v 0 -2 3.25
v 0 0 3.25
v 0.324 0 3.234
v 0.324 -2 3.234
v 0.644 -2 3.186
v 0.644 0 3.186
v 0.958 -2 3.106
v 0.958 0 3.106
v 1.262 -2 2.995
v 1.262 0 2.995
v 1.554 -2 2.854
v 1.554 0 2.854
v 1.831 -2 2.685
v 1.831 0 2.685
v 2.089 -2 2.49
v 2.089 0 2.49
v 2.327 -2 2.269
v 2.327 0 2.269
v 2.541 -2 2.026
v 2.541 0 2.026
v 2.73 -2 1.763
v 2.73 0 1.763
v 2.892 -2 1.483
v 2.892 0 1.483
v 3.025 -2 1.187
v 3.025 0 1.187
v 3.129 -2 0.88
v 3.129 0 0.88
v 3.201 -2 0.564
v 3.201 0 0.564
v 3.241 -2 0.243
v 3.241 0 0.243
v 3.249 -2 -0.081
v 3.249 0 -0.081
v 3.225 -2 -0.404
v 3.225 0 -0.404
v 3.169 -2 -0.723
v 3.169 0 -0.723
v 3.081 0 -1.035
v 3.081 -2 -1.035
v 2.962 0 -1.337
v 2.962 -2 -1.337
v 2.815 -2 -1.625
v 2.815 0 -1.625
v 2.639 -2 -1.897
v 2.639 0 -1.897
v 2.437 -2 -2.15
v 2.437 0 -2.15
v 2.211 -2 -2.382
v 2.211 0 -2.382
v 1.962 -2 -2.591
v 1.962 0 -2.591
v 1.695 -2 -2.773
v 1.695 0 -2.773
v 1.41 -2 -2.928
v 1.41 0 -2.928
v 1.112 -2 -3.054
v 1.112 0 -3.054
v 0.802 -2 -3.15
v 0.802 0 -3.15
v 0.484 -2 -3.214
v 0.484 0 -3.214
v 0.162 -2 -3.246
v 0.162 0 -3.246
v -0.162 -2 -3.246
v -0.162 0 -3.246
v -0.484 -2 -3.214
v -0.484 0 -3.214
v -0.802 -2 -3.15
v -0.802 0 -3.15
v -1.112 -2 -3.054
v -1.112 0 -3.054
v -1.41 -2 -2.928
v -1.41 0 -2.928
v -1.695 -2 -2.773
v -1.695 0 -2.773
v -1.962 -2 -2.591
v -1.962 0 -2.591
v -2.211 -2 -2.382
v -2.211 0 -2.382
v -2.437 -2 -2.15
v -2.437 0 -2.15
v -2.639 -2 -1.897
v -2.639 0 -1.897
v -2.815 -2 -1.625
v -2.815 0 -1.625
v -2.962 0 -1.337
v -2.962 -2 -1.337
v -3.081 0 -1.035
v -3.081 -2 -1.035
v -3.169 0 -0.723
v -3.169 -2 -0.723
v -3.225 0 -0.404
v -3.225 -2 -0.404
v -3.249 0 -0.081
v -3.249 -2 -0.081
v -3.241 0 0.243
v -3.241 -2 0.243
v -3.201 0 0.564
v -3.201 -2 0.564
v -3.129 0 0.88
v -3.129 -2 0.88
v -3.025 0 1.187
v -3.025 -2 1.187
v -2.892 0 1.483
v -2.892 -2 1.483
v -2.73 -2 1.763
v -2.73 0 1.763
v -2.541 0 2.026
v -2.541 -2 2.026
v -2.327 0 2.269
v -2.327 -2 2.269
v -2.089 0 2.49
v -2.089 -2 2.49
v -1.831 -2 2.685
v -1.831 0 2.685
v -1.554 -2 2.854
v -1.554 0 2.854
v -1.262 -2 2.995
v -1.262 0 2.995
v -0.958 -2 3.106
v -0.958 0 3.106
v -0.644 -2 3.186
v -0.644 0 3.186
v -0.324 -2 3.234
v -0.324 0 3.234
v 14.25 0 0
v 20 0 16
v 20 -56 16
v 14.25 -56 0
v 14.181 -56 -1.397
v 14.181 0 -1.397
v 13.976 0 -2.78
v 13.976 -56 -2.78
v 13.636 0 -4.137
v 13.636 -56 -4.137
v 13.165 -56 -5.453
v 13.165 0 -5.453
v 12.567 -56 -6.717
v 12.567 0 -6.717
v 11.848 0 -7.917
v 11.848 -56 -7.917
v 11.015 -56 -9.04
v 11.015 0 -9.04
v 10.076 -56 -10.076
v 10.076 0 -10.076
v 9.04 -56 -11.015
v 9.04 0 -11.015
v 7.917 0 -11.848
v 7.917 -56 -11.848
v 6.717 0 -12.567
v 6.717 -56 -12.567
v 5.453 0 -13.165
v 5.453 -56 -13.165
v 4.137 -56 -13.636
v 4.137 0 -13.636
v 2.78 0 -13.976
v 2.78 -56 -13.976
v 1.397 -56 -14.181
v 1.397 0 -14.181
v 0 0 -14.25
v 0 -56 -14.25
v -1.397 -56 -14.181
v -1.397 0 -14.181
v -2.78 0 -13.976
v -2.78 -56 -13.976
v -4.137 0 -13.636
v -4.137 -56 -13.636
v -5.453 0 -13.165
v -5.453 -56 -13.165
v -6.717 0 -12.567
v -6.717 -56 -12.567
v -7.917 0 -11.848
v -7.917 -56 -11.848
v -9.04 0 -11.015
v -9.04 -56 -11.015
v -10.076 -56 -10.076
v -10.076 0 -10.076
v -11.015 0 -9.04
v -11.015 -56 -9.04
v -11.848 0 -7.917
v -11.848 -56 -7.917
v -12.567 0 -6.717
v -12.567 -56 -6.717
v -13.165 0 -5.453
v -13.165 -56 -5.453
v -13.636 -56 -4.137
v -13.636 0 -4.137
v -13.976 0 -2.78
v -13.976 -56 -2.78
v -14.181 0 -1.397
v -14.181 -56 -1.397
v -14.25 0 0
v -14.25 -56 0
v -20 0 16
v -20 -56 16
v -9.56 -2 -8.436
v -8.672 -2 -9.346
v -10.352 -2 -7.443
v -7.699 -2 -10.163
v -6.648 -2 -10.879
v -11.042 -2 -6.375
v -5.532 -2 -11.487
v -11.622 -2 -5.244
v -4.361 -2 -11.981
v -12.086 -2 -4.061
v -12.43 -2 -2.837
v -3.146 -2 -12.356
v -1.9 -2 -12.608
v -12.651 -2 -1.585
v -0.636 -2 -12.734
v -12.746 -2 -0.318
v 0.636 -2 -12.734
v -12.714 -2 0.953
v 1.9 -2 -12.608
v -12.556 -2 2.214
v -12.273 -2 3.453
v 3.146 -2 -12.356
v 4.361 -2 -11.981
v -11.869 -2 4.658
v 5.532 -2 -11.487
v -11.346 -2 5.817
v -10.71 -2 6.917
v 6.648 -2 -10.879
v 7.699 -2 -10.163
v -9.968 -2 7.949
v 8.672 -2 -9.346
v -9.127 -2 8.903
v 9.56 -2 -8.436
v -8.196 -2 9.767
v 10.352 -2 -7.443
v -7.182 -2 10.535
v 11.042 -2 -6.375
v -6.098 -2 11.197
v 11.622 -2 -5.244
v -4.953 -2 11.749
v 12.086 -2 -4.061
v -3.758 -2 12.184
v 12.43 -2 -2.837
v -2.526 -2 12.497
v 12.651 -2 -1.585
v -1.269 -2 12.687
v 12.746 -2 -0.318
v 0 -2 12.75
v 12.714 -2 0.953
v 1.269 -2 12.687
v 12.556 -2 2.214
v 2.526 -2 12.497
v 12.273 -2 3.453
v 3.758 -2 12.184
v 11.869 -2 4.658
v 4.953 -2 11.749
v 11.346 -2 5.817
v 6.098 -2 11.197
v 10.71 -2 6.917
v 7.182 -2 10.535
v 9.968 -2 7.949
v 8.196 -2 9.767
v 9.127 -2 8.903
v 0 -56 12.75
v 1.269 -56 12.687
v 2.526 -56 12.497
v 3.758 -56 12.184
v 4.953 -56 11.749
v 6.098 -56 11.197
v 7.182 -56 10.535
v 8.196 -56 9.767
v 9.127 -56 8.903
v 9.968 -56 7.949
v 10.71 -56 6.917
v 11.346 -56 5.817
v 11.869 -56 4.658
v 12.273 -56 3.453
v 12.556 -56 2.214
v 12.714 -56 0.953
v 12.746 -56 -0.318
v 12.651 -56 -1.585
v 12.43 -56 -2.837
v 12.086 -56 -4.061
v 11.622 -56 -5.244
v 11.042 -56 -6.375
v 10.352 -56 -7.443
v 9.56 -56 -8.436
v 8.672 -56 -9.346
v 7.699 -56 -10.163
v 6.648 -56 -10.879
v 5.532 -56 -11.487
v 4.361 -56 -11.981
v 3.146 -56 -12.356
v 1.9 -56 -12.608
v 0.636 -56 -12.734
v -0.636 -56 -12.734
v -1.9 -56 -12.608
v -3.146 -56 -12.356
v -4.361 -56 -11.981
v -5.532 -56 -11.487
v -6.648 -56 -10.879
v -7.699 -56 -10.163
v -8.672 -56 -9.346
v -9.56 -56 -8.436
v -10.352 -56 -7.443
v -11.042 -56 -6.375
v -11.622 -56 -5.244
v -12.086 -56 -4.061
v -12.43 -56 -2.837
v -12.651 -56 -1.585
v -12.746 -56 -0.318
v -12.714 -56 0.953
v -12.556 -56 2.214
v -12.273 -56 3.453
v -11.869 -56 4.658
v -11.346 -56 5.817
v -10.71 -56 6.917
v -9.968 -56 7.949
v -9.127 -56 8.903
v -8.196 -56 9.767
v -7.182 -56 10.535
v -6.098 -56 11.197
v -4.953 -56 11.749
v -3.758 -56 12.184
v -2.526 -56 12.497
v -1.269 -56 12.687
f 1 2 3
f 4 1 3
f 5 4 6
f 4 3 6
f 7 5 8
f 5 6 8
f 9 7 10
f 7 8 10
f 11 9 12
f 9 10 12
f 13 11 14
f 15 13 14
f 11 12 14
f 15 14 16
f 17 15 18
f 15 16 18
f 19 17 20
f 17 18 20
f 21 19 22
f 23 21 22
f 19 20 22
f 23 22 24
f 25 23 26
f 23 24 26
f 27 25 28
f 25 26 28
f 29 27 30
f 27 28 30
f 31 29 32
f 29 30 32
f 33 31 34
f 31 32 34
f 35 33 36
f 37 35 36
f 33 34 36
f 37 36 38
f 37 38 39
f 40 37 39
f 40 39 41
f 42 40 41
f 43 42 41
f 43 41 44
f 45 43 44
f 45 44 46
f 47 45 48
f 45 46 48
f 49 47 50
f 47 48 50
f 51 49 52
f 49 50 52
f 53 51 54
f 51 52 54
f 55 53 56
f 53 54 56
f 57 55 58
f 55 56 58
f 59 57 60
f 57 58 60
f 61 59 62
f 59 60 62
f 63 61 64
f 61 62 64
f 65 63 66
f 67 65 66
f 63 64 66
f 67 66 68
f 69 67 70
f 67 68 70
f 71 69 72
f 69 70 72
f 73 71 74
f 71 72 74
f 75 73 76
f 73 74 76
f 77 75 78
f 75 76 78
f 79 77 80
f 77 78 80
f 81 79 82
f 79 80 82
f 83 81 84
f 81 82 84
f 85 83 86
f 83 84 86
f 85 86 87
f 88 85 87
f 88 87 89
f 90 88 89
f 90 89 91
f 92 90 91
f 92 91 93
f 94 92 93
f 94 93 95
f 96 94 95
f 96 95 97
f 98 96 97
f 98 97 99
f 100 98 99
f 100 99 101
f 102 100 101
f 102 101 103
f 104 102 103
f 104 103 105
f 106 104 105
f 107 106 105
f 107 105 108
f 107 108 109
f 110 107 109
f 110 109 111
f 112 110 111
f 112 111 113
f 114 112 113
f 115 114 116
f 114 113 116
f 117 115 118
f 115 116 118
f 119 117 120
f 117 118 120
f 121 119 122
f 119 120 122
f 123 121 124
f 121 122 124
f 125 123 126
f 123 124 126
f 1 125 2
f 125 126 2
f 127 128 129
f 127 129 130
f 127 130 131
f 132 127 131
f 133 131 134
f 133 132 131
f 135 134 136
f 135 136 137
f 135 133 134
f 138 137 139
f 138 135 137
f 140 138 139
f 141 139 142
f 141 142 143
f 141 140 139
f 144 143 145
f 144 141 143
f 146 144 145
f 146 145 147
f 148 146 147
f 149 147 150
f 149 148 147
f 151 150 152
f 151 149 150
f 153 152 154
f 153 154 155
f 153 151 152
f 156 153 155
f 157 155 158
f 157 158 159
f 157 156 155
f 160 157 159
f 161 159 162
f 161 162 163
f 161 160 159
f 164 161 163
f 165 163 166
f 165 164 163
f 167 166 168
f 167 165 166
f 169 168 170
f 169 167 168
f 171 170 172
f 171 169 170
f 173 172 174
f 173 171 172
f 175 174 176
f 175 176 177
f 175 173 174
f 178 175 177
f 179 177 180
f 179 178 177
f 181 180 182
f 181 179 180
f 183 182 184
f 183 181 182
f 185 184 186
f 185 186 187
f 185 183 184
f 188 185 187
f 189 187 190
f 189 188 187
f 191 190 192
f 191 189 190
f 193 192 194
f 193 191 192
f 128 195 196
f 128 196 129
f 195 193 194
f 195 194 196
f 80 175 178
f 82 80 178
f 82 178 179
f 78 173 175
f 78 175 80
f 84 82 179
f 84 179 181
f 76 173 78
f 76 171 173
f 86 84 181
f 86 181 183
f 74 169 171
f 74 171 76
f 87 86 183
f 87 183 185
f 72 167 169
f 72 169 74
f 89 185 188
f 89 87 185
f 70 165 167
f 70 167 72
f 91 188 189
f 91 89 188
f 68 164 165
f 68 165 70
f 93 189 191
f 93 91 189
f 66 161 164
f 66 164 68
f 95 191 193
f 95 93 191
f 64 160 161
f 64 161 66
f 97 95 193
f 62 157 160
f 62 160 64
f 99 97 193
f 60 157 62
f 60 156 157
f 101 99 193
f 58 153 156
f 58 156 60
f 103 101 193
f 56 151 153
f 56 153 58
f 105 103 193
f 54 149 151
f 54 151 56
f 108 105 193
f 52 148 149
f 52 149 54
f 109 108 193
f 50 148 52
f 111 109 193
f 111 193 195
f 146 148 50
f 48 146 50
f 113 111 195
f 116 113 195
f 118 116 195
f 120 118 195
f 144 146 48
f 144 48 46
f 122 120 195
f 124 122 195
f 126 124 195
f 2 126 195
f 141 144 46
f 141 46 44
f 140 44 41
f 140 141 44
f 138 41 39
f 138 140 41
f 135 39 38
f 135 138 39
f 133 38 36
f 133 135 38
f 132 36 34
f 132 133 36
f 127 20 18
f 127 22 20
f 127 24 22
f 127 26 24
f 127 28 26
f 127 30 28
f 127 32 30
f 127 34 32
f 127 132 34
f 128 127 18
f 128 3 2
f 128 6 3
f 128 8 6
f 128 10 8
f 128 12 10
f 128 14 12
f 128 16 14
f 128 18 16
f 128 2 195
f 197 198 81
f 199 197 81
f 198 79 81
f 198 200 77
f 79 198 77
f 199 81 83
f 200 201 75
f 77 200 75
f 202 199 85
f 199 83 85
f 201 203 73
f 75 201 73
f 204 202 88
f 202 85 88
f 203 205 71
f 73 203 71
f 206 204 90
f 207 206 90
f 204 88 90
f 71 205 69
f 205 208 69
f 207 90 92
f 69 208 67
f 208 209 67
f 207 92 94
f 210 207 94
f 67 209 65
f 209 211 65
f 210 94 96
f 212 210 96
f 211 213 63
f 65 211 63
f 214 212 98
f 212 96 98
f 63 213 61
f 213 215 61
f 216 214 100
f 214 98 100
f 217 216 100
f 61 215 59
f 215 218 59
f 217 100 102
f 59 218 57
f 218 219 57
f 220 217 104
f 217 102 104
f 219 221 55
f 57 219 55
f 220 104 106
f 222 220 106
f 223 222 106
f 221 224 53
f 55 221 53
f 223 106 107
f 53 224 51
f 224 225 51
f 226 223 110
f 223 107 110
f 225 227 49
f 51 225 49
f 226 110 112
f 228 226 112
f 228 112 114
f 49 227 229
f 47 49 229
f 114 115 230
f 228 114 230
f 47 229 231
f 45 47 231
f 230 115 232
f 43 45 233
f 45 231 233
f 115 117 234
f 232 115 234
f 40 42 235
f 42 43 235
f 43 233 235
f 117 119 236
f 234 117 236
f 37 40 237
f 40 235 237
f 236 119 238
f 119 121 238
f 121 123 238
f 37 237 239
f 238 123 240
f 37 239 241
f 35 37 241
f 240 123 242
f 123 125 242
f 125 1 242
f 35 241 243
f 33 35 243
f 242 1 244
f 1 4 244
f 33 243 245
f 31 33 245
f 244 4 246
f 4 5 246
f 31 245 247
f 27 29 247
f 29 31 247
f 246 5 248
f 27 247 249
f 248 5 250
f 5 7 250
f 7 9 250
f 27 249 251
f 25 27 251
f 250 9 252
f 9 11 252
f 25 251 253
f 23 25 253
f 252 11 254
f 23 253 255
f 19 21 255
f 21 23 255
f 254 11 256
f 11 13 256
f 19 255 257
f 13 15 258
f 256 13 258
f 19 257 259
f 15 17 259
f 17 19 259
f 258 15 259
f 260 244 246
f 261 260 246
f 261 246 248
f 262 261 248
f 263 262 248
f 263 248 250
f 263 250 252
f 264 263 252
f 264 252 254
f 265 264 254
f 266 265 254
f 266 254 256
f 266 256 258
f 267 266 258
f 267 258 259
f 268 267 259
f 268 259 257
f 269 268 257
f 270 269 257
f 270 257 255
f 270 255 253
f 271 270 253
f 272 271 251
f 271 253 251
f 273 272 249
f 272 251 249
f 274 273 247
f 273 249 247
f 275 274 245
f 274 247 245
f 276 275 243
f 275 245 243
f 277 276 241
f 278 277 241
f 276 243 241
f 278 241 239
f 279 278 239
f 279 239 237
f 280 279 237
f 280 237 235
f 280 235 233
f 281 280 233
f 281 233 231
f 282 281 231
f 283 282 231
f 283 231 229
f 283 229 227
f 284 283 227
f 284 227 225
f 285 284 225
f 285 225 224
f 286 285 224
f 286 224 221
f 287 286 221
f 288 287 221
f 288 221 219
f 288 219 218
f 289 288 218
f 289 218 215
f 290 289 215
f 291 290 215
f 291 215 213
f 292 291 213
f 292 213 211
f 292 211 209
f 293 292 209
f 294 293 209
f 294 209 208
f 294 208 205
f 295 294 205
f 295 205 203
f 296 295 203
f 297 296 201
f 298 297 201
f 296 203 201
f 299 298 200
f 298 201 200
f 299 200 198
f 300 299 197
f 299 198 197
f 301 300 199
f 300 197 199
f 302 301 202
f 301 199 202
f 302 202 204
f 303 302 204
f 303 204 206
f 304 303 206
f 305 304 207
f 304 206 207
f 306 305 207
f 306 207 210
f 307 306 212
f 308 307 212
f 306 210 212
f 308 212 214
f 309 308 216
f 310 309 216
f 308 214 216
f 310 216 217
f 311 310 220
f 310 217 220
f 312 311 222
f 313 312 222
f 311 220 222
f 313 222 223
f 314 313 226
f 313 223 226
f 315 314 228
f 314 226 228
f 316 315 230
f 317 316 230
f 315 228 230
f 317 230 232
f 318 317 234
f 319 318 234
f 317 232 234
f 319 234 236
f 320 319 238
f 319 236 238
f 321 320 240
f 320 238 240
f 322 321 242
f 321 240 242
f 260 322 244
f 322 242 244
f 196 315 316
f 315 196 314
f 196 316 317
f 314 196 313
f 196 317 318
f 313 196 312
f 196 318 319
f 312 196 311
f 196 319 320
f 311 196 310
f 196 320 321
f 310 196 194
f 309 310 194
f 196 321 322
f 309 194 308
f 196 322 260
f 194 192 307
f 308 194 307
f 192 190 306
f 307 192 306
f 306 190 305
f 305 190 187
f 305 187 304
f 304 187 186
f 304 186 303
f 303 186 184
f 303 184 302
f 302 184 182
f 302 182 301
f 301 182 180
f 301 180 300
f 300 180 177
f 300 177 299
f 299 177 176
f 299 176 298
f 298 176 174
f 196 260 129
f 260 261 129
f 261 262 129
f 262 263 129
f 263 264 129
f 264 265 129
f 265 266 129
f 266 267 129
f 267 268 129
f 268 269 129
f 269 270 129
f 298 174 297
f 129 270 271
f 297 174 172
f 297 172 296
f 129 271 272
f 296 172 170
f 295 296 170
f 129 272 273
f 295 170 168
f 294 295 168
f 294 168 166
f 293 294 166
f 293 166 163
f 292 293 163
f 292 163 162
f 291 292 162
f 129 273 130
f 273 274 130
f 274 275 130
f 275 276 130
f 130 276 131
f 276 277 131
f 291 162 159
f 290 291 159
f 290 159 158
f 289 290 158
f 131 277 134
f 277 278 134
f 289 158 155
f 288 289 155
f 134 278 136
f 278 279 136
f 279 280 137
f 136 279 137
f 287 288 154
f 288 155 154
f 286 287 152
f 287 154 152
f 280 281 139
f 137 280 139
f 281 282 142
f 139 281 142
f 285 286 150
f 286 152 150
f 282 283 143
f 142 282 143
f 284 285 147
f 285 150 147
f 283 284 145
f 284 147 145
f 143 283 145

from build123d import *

# Parameters (mm, degrees)
SKETCH2_R           = 12.75
BOSS_EXTRUDE1_DEPTH = 56
SKETCH3_R           = 12.75
SKETCH3_R_2         = 3.25
BOSS_EXTRUDE2_DEPTH = 2


with BuildPart() as part:
    # Sketch2 → Boss-Extrude1 (new body)
    with BuildSketch(Plane(origin=(0, 0, 0), x_dir=(1, 0, 0), z_dir=(0, 1, 0))):
        with BuildLine():
            Line((-20, -16), (20, -16))
            Line((20, -16), (14.25, 0))
            ThreePointArc((14.25, 0), (0, 14.25), (-14.25, 0))
            Line((-14.25, 0), (-20, -16))
        make_face()
        with Locations(Location((0, 0, 0), (0, 0, 270))):
            Circle(SKETCH2_R, mode=Mode.SUBTRACT)
    extrude(amount=-BOSS_EXTRUDE1_DEPTH)

    # Sketch3 → Boss-Extrude2 (add)
    with BuildSketch(Plane(origin=(0, 0, 0), x_dir=(1, 0, 0), z_dir=(0, 1, 0))):
        with Locations(Location((0, 0, 0), (0, 0, 270))):
            Circle(SKETCH3_R)
        with Locations(Location((0, 0, 0), (0, 0, 270))):
            Circle(SKETCH3_R_2, mode=Mode.SUBTRACT)
    extrude(amount=-BOSS_EXTRUDE2_DEPTH)


solid = part.part
